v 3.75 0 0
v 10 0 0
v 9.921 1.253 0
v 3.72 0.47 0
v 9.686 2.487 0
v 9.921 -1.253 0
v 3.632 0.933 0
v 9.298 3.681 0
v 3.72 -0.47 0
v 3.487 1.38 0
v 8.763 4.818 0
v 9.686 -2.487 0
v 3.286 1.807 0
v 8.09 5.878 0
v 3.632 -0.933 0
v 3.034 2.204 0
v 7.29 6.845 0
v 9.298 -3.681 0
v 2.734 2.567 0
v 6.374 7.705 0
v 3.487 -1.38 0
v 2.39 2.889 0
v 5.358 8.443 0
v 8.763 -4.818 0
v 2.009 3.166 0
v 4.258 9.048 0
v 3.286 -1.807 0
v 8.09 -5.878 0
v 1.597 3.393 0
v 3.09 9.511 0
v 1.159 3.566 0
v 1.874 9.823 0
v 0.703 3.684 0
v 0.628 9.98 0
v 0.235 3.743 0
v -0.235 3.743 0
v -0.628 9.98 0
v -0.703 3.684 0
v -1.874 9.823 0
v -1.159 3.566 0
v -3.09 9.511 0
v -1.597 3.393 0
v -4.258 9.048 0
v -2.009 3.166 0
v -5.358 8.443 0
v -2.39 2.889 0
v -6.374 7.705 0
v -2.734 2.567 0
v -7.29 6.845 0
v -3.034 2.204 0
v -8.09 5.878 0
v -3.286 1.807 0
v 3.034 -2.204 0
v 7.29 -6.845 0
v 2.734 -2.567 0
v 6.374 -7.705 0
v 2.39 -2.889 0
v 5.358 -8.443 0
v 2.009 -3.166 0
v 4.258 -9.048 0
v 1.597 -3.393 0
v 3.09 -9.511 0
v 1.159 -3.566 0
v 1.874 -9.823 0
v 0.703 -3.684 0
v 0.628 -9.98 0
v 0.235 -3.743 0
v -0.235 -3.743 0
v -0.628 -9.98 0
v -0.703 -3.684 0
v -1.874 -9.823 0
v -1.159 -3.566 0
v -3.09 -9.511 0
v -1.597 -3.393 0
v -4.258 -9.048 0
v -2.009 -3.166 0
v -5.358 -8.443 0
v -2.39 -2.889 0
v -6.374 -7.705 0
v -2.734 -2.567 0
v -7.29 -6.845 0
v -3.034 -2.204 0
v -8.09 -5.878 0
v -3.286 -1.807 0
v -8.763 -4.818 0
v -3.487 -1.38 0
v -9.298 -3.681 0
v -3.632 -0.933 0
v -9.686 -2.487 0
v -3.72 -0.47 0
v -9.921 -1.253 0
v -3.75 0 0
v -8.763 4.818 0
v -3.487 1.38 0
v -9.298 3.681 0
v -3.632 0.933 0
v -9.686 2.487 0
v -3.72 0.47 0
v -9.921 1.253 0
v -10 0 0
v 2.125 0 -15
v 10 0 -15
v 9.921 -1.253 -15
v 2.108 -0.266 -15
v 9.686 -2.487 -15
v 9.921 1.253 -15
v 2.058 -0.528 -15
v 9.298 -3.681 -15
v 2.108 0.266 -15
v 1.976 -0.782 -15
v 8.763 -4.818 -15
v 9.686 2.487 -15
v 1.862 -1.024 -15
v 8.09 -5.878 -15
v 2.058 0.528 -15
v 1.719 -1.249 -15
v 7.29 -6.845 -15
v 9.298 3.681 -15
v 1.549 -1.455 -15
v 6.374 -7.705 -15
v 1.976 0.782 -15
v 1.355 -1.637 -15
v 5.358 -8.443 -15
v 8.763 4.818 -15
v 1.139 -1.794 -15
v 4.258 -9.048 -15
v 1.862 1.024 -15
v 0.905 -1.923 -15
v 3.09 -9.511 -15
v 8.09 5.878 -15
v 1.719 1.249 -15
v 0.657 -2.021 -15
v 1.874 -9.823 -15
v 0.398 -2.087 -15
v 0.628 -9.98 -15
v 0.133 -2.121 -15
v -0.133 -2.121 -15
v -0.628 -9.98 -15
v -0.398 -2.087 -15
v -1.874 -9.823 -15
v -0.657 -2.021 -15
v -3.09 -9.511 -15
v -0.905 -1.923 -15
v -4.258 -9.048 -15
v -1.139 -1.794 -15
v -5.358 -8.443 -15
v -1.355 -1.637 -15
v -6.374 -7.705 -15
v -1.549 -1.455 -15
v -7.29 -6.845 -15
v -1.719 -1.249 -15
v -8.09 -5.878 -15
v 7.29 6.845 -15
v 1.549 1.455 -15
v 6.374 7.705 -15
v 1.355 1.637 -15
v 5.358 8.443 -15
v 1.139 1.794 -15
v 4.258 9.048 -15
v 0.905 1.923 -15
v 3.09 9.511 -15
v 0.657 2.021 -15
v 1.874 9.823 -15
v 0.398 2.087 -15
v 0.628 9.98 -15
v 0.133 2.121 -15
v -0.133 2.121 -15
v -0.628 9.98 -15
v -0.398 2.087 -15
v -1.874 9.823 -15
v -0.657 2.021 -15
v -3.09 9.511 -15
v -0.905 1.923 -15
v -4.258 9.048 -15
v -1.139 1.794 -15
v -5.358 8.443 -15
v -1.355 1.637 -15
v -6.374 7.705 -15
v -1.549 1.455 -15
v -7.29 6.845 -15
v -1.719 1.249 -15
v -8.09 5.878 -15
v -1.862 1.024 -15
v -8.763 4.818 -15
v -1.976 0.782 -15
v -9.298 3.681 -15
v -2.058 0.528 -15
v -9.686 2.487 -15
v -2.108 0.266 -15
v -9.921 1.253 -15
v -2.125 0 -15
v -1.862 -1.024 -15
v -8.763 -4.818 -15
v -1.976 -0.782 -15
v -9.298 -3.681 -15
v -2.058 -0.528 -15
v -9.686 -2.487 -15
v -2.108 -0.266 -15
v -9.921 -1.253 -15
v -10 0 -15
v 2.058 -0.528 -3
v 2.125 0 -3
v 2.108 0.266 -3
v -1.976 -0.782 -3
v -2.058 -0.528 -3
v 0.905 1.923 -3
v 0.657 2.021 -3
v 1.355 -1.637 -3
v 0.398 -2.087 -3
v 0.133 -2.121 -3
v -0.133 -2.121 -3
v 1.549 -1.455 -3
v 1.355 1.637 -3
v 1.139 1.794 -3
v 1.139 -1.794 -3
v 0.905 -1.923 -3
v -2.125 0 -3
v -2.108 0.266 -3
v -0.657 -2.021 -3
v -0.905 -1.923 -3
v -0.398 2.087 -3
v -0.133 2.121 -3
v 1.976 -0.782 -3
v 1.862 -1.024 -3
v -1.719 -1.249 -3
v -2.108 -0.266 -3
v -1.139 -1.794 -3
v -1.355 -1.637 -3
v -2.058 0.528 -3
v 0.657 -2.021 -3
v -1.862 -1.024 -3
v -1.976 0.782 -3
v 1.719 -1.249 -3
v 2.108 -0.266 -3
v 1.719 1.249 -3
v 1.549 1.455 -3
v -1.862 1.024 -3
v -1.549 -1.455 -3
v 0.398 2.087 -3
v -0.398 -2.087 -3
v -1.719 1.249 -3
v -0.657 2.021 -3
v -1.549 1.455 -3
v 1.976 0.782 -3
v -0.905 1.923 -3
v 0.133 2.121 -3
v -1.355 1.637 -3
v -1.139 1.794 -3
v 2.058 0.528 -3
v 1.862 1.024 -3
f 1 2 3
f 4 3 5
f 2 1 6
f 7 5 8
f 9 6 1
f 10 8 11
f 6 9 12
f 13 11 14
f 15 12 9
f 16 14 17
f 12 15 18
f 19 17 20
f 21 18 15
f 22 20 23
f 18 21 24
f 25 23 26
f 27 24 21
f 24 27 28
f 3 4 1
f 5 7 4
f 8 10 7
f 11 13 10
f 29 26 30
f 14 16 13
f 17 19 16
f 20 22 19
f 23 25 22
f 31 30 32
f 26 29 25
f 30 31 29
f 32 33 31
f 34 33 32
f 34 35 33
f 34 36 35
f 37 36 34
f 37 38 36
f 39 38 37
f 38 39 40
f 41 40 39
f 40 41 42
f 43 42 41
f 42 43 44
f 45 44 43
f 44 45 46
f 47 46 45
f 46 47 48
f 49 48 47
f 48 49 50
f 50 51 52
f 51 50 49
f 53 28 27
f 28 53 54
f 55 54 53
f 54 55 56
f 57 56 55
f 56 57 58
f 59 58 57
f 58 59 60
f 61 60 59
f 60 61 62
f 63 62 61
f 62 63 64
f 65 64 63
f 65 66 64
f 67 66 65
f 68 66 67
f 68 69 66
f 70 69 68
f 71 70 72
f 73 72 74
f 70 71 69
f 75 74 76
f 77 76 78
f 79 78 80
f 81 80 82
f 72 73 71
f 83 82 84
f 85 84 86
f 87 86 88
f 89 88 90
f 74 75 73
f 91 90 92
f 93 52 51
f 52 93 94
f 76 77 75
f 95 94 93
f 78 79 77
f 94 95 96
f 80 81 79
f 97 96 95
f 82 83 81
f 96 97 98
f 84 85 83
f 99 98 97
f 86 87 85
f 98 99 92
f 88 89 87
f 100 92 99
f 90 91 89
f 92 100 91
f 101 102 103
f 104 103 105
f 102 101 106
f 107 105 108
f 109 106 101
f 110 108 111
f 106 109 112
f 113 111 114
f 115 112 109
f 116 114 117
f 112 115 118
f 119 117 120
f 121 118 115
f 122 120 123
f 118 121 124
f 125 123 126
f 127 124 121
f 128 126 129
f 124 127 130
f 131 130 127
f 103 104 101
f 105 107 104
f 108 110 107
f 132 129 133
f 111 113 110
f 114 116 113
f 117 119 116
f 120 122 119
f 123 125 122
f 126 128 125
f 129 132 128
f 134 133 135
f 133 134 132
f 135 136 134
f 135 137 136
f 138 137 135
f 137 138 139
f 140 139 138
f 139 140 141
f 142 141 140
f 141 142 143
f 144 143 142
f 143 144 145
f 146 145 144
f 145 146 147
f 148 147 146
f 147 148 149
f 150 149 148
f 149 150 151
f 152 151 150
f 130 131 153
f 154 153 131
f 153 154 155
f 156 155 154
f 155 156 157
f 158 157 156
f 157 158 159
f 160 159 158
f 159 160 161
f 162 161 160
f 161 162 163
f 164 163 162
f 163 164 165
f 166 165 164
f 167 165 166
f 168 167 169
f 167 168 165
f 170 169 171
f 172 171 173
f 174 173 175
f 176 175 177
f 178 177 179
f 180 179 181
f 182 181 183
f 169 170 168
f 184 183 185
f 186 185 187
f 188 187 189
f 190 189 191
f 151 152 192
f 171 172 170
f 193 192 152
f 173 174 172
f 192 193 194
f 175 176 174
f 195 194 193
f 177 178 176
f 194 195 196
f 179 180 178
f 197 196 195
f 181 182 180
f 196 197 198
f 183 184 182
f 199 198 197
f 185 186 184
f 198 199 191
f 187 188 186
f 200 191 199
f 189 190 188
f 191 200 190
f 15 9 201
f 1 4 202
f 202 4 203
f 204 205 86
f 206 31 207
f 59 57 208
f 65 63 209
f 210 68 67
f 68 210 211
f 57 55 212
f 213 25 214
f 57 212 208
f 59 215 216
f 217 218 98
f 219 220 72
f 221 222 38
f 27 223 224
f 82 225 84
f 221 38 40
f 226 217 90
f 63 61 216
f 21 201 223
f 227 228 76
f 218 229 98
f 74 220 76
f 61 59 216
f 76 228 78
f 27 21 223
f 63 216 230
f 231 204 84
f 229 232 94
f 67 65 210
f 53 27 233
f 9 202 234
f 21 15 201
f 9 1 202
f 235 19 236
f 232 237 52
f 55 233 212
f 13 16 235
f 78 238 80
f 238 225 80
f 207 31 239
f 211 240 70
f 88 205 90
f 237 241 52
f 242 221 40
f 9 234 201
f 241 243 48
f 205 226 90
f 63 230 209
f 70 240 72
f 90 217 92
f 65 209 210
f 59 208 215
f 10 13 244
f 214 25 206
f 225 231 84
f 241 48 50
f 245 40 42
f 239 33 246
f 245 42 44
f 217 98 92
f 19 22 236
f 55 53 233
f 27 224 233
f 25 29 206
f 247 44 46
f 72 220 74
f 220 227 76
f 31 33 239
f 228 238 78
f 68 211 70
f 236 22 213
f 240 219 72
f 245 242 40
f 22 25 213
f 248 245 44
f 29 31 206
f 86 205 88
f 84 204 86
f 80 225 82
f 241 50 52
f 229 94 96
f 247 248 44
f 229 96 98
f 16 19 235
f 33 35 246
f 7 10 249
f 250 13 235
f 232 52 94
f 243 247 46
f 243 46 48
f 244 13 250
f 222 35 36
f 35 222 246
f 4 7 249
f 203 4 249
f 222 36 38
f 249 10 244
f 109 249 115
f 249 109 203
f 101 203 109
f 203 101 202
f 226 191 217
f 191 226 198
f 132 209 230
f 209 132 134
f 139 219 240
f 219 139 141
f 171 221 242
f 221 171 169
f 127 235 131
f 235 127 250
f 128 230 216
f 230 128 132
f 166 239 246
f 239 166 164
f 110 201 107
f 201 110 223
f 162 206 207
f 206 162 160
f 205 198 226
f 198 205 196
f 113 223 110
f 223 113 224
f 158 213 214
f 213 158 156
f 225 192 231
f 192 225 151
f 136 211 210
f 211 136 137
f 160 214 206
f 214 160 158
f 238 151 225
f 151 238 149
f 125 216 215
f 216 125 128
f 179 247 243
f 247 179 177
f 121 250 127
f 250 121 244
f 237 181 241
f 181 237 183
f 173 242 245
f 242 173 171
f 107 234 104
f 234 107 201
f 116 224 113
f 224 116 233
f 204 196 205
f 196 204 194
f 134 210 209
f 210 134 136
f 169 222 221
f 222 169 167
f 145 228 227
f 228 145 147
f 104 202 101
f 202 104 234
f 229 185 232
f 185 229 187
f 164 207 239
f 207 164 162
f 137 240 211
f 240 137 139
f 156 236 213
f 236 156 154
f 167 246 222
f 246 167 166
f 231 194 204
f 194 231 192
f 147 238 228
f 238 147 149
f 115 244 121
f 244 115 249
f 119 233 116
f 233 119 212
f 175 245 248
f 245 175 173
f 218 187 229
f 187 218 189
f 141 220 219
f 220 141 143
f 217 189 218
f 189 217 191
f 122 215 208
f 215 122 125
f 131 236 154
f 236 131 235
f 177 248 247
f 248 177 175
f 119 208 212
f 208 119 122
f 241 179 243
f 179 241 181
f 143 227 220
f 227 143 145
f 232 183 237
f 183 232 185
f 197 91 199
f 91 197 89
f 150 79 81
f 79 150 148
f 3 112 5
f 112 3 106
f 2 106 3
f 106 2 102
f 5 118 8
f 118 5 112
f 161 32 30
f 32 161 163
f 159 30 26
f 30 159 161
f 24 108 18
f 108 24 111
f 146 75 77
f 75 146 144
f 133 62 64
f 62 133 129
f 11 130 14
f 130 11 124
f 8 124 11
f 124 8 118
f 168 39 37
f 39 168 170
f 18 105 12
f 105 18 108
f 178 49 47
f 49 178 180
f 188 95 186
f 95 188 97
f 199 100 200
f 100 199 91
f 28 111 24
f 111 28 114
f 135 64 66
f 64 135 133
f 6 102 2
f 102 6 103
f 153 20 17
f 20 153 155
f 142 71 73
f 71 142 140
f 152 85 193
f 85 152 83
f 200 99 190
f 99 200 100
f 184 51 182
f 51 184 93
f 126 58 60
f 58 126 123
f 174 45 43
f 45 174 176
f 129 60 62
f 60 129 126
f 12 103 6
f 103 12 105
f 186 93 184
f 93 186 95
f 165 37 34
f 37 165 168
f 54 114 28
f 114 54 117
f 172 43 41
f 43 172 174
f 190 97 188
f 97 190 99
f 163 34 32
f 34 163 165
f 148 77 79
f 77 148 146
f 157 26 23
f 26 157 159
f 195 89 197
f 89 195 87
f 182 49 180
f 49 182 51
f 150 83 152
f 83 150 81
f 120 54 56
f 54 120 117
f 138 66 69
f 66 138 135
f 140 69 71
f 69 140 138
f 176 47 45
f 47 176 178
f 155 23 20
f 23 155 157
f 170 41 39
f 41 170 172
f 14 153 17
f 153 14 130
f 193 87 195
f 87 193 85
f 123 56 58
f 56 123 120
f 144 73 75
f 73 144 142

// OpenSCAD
$fn = 50;


difference() {
	union() {
		translate(v = [0, 0, -15.0000000000]) {
			cylinder(h = 15, r = 10.0000000000);
		}
	}
	union() {
		translate(v = [0, 0, 0]) {
			rotate(a = [0, 0, 0]) {
				difference() {
					union() {
						#translate(v = [0, 0, -15.0000000000]) {
							cylinder(h = 15, r = 2.0000000000);
						}
						#translate(v = [0, 0, -3]) {
							cylinder(h = 3, r1 = 2.1250000000, r2 = 3.7500000000);
						}
						#translate(v = [0, 0, -15.0000000000]) {
							cylinder(h = 15, r = 2.1250000000);
						}
						#translate(v = [0, 0, -15.0000000000]) {
							cylinder(h = 15, r = 2.0000000000);
						}
					}
					union();
				}
			}
		}
	}
}
